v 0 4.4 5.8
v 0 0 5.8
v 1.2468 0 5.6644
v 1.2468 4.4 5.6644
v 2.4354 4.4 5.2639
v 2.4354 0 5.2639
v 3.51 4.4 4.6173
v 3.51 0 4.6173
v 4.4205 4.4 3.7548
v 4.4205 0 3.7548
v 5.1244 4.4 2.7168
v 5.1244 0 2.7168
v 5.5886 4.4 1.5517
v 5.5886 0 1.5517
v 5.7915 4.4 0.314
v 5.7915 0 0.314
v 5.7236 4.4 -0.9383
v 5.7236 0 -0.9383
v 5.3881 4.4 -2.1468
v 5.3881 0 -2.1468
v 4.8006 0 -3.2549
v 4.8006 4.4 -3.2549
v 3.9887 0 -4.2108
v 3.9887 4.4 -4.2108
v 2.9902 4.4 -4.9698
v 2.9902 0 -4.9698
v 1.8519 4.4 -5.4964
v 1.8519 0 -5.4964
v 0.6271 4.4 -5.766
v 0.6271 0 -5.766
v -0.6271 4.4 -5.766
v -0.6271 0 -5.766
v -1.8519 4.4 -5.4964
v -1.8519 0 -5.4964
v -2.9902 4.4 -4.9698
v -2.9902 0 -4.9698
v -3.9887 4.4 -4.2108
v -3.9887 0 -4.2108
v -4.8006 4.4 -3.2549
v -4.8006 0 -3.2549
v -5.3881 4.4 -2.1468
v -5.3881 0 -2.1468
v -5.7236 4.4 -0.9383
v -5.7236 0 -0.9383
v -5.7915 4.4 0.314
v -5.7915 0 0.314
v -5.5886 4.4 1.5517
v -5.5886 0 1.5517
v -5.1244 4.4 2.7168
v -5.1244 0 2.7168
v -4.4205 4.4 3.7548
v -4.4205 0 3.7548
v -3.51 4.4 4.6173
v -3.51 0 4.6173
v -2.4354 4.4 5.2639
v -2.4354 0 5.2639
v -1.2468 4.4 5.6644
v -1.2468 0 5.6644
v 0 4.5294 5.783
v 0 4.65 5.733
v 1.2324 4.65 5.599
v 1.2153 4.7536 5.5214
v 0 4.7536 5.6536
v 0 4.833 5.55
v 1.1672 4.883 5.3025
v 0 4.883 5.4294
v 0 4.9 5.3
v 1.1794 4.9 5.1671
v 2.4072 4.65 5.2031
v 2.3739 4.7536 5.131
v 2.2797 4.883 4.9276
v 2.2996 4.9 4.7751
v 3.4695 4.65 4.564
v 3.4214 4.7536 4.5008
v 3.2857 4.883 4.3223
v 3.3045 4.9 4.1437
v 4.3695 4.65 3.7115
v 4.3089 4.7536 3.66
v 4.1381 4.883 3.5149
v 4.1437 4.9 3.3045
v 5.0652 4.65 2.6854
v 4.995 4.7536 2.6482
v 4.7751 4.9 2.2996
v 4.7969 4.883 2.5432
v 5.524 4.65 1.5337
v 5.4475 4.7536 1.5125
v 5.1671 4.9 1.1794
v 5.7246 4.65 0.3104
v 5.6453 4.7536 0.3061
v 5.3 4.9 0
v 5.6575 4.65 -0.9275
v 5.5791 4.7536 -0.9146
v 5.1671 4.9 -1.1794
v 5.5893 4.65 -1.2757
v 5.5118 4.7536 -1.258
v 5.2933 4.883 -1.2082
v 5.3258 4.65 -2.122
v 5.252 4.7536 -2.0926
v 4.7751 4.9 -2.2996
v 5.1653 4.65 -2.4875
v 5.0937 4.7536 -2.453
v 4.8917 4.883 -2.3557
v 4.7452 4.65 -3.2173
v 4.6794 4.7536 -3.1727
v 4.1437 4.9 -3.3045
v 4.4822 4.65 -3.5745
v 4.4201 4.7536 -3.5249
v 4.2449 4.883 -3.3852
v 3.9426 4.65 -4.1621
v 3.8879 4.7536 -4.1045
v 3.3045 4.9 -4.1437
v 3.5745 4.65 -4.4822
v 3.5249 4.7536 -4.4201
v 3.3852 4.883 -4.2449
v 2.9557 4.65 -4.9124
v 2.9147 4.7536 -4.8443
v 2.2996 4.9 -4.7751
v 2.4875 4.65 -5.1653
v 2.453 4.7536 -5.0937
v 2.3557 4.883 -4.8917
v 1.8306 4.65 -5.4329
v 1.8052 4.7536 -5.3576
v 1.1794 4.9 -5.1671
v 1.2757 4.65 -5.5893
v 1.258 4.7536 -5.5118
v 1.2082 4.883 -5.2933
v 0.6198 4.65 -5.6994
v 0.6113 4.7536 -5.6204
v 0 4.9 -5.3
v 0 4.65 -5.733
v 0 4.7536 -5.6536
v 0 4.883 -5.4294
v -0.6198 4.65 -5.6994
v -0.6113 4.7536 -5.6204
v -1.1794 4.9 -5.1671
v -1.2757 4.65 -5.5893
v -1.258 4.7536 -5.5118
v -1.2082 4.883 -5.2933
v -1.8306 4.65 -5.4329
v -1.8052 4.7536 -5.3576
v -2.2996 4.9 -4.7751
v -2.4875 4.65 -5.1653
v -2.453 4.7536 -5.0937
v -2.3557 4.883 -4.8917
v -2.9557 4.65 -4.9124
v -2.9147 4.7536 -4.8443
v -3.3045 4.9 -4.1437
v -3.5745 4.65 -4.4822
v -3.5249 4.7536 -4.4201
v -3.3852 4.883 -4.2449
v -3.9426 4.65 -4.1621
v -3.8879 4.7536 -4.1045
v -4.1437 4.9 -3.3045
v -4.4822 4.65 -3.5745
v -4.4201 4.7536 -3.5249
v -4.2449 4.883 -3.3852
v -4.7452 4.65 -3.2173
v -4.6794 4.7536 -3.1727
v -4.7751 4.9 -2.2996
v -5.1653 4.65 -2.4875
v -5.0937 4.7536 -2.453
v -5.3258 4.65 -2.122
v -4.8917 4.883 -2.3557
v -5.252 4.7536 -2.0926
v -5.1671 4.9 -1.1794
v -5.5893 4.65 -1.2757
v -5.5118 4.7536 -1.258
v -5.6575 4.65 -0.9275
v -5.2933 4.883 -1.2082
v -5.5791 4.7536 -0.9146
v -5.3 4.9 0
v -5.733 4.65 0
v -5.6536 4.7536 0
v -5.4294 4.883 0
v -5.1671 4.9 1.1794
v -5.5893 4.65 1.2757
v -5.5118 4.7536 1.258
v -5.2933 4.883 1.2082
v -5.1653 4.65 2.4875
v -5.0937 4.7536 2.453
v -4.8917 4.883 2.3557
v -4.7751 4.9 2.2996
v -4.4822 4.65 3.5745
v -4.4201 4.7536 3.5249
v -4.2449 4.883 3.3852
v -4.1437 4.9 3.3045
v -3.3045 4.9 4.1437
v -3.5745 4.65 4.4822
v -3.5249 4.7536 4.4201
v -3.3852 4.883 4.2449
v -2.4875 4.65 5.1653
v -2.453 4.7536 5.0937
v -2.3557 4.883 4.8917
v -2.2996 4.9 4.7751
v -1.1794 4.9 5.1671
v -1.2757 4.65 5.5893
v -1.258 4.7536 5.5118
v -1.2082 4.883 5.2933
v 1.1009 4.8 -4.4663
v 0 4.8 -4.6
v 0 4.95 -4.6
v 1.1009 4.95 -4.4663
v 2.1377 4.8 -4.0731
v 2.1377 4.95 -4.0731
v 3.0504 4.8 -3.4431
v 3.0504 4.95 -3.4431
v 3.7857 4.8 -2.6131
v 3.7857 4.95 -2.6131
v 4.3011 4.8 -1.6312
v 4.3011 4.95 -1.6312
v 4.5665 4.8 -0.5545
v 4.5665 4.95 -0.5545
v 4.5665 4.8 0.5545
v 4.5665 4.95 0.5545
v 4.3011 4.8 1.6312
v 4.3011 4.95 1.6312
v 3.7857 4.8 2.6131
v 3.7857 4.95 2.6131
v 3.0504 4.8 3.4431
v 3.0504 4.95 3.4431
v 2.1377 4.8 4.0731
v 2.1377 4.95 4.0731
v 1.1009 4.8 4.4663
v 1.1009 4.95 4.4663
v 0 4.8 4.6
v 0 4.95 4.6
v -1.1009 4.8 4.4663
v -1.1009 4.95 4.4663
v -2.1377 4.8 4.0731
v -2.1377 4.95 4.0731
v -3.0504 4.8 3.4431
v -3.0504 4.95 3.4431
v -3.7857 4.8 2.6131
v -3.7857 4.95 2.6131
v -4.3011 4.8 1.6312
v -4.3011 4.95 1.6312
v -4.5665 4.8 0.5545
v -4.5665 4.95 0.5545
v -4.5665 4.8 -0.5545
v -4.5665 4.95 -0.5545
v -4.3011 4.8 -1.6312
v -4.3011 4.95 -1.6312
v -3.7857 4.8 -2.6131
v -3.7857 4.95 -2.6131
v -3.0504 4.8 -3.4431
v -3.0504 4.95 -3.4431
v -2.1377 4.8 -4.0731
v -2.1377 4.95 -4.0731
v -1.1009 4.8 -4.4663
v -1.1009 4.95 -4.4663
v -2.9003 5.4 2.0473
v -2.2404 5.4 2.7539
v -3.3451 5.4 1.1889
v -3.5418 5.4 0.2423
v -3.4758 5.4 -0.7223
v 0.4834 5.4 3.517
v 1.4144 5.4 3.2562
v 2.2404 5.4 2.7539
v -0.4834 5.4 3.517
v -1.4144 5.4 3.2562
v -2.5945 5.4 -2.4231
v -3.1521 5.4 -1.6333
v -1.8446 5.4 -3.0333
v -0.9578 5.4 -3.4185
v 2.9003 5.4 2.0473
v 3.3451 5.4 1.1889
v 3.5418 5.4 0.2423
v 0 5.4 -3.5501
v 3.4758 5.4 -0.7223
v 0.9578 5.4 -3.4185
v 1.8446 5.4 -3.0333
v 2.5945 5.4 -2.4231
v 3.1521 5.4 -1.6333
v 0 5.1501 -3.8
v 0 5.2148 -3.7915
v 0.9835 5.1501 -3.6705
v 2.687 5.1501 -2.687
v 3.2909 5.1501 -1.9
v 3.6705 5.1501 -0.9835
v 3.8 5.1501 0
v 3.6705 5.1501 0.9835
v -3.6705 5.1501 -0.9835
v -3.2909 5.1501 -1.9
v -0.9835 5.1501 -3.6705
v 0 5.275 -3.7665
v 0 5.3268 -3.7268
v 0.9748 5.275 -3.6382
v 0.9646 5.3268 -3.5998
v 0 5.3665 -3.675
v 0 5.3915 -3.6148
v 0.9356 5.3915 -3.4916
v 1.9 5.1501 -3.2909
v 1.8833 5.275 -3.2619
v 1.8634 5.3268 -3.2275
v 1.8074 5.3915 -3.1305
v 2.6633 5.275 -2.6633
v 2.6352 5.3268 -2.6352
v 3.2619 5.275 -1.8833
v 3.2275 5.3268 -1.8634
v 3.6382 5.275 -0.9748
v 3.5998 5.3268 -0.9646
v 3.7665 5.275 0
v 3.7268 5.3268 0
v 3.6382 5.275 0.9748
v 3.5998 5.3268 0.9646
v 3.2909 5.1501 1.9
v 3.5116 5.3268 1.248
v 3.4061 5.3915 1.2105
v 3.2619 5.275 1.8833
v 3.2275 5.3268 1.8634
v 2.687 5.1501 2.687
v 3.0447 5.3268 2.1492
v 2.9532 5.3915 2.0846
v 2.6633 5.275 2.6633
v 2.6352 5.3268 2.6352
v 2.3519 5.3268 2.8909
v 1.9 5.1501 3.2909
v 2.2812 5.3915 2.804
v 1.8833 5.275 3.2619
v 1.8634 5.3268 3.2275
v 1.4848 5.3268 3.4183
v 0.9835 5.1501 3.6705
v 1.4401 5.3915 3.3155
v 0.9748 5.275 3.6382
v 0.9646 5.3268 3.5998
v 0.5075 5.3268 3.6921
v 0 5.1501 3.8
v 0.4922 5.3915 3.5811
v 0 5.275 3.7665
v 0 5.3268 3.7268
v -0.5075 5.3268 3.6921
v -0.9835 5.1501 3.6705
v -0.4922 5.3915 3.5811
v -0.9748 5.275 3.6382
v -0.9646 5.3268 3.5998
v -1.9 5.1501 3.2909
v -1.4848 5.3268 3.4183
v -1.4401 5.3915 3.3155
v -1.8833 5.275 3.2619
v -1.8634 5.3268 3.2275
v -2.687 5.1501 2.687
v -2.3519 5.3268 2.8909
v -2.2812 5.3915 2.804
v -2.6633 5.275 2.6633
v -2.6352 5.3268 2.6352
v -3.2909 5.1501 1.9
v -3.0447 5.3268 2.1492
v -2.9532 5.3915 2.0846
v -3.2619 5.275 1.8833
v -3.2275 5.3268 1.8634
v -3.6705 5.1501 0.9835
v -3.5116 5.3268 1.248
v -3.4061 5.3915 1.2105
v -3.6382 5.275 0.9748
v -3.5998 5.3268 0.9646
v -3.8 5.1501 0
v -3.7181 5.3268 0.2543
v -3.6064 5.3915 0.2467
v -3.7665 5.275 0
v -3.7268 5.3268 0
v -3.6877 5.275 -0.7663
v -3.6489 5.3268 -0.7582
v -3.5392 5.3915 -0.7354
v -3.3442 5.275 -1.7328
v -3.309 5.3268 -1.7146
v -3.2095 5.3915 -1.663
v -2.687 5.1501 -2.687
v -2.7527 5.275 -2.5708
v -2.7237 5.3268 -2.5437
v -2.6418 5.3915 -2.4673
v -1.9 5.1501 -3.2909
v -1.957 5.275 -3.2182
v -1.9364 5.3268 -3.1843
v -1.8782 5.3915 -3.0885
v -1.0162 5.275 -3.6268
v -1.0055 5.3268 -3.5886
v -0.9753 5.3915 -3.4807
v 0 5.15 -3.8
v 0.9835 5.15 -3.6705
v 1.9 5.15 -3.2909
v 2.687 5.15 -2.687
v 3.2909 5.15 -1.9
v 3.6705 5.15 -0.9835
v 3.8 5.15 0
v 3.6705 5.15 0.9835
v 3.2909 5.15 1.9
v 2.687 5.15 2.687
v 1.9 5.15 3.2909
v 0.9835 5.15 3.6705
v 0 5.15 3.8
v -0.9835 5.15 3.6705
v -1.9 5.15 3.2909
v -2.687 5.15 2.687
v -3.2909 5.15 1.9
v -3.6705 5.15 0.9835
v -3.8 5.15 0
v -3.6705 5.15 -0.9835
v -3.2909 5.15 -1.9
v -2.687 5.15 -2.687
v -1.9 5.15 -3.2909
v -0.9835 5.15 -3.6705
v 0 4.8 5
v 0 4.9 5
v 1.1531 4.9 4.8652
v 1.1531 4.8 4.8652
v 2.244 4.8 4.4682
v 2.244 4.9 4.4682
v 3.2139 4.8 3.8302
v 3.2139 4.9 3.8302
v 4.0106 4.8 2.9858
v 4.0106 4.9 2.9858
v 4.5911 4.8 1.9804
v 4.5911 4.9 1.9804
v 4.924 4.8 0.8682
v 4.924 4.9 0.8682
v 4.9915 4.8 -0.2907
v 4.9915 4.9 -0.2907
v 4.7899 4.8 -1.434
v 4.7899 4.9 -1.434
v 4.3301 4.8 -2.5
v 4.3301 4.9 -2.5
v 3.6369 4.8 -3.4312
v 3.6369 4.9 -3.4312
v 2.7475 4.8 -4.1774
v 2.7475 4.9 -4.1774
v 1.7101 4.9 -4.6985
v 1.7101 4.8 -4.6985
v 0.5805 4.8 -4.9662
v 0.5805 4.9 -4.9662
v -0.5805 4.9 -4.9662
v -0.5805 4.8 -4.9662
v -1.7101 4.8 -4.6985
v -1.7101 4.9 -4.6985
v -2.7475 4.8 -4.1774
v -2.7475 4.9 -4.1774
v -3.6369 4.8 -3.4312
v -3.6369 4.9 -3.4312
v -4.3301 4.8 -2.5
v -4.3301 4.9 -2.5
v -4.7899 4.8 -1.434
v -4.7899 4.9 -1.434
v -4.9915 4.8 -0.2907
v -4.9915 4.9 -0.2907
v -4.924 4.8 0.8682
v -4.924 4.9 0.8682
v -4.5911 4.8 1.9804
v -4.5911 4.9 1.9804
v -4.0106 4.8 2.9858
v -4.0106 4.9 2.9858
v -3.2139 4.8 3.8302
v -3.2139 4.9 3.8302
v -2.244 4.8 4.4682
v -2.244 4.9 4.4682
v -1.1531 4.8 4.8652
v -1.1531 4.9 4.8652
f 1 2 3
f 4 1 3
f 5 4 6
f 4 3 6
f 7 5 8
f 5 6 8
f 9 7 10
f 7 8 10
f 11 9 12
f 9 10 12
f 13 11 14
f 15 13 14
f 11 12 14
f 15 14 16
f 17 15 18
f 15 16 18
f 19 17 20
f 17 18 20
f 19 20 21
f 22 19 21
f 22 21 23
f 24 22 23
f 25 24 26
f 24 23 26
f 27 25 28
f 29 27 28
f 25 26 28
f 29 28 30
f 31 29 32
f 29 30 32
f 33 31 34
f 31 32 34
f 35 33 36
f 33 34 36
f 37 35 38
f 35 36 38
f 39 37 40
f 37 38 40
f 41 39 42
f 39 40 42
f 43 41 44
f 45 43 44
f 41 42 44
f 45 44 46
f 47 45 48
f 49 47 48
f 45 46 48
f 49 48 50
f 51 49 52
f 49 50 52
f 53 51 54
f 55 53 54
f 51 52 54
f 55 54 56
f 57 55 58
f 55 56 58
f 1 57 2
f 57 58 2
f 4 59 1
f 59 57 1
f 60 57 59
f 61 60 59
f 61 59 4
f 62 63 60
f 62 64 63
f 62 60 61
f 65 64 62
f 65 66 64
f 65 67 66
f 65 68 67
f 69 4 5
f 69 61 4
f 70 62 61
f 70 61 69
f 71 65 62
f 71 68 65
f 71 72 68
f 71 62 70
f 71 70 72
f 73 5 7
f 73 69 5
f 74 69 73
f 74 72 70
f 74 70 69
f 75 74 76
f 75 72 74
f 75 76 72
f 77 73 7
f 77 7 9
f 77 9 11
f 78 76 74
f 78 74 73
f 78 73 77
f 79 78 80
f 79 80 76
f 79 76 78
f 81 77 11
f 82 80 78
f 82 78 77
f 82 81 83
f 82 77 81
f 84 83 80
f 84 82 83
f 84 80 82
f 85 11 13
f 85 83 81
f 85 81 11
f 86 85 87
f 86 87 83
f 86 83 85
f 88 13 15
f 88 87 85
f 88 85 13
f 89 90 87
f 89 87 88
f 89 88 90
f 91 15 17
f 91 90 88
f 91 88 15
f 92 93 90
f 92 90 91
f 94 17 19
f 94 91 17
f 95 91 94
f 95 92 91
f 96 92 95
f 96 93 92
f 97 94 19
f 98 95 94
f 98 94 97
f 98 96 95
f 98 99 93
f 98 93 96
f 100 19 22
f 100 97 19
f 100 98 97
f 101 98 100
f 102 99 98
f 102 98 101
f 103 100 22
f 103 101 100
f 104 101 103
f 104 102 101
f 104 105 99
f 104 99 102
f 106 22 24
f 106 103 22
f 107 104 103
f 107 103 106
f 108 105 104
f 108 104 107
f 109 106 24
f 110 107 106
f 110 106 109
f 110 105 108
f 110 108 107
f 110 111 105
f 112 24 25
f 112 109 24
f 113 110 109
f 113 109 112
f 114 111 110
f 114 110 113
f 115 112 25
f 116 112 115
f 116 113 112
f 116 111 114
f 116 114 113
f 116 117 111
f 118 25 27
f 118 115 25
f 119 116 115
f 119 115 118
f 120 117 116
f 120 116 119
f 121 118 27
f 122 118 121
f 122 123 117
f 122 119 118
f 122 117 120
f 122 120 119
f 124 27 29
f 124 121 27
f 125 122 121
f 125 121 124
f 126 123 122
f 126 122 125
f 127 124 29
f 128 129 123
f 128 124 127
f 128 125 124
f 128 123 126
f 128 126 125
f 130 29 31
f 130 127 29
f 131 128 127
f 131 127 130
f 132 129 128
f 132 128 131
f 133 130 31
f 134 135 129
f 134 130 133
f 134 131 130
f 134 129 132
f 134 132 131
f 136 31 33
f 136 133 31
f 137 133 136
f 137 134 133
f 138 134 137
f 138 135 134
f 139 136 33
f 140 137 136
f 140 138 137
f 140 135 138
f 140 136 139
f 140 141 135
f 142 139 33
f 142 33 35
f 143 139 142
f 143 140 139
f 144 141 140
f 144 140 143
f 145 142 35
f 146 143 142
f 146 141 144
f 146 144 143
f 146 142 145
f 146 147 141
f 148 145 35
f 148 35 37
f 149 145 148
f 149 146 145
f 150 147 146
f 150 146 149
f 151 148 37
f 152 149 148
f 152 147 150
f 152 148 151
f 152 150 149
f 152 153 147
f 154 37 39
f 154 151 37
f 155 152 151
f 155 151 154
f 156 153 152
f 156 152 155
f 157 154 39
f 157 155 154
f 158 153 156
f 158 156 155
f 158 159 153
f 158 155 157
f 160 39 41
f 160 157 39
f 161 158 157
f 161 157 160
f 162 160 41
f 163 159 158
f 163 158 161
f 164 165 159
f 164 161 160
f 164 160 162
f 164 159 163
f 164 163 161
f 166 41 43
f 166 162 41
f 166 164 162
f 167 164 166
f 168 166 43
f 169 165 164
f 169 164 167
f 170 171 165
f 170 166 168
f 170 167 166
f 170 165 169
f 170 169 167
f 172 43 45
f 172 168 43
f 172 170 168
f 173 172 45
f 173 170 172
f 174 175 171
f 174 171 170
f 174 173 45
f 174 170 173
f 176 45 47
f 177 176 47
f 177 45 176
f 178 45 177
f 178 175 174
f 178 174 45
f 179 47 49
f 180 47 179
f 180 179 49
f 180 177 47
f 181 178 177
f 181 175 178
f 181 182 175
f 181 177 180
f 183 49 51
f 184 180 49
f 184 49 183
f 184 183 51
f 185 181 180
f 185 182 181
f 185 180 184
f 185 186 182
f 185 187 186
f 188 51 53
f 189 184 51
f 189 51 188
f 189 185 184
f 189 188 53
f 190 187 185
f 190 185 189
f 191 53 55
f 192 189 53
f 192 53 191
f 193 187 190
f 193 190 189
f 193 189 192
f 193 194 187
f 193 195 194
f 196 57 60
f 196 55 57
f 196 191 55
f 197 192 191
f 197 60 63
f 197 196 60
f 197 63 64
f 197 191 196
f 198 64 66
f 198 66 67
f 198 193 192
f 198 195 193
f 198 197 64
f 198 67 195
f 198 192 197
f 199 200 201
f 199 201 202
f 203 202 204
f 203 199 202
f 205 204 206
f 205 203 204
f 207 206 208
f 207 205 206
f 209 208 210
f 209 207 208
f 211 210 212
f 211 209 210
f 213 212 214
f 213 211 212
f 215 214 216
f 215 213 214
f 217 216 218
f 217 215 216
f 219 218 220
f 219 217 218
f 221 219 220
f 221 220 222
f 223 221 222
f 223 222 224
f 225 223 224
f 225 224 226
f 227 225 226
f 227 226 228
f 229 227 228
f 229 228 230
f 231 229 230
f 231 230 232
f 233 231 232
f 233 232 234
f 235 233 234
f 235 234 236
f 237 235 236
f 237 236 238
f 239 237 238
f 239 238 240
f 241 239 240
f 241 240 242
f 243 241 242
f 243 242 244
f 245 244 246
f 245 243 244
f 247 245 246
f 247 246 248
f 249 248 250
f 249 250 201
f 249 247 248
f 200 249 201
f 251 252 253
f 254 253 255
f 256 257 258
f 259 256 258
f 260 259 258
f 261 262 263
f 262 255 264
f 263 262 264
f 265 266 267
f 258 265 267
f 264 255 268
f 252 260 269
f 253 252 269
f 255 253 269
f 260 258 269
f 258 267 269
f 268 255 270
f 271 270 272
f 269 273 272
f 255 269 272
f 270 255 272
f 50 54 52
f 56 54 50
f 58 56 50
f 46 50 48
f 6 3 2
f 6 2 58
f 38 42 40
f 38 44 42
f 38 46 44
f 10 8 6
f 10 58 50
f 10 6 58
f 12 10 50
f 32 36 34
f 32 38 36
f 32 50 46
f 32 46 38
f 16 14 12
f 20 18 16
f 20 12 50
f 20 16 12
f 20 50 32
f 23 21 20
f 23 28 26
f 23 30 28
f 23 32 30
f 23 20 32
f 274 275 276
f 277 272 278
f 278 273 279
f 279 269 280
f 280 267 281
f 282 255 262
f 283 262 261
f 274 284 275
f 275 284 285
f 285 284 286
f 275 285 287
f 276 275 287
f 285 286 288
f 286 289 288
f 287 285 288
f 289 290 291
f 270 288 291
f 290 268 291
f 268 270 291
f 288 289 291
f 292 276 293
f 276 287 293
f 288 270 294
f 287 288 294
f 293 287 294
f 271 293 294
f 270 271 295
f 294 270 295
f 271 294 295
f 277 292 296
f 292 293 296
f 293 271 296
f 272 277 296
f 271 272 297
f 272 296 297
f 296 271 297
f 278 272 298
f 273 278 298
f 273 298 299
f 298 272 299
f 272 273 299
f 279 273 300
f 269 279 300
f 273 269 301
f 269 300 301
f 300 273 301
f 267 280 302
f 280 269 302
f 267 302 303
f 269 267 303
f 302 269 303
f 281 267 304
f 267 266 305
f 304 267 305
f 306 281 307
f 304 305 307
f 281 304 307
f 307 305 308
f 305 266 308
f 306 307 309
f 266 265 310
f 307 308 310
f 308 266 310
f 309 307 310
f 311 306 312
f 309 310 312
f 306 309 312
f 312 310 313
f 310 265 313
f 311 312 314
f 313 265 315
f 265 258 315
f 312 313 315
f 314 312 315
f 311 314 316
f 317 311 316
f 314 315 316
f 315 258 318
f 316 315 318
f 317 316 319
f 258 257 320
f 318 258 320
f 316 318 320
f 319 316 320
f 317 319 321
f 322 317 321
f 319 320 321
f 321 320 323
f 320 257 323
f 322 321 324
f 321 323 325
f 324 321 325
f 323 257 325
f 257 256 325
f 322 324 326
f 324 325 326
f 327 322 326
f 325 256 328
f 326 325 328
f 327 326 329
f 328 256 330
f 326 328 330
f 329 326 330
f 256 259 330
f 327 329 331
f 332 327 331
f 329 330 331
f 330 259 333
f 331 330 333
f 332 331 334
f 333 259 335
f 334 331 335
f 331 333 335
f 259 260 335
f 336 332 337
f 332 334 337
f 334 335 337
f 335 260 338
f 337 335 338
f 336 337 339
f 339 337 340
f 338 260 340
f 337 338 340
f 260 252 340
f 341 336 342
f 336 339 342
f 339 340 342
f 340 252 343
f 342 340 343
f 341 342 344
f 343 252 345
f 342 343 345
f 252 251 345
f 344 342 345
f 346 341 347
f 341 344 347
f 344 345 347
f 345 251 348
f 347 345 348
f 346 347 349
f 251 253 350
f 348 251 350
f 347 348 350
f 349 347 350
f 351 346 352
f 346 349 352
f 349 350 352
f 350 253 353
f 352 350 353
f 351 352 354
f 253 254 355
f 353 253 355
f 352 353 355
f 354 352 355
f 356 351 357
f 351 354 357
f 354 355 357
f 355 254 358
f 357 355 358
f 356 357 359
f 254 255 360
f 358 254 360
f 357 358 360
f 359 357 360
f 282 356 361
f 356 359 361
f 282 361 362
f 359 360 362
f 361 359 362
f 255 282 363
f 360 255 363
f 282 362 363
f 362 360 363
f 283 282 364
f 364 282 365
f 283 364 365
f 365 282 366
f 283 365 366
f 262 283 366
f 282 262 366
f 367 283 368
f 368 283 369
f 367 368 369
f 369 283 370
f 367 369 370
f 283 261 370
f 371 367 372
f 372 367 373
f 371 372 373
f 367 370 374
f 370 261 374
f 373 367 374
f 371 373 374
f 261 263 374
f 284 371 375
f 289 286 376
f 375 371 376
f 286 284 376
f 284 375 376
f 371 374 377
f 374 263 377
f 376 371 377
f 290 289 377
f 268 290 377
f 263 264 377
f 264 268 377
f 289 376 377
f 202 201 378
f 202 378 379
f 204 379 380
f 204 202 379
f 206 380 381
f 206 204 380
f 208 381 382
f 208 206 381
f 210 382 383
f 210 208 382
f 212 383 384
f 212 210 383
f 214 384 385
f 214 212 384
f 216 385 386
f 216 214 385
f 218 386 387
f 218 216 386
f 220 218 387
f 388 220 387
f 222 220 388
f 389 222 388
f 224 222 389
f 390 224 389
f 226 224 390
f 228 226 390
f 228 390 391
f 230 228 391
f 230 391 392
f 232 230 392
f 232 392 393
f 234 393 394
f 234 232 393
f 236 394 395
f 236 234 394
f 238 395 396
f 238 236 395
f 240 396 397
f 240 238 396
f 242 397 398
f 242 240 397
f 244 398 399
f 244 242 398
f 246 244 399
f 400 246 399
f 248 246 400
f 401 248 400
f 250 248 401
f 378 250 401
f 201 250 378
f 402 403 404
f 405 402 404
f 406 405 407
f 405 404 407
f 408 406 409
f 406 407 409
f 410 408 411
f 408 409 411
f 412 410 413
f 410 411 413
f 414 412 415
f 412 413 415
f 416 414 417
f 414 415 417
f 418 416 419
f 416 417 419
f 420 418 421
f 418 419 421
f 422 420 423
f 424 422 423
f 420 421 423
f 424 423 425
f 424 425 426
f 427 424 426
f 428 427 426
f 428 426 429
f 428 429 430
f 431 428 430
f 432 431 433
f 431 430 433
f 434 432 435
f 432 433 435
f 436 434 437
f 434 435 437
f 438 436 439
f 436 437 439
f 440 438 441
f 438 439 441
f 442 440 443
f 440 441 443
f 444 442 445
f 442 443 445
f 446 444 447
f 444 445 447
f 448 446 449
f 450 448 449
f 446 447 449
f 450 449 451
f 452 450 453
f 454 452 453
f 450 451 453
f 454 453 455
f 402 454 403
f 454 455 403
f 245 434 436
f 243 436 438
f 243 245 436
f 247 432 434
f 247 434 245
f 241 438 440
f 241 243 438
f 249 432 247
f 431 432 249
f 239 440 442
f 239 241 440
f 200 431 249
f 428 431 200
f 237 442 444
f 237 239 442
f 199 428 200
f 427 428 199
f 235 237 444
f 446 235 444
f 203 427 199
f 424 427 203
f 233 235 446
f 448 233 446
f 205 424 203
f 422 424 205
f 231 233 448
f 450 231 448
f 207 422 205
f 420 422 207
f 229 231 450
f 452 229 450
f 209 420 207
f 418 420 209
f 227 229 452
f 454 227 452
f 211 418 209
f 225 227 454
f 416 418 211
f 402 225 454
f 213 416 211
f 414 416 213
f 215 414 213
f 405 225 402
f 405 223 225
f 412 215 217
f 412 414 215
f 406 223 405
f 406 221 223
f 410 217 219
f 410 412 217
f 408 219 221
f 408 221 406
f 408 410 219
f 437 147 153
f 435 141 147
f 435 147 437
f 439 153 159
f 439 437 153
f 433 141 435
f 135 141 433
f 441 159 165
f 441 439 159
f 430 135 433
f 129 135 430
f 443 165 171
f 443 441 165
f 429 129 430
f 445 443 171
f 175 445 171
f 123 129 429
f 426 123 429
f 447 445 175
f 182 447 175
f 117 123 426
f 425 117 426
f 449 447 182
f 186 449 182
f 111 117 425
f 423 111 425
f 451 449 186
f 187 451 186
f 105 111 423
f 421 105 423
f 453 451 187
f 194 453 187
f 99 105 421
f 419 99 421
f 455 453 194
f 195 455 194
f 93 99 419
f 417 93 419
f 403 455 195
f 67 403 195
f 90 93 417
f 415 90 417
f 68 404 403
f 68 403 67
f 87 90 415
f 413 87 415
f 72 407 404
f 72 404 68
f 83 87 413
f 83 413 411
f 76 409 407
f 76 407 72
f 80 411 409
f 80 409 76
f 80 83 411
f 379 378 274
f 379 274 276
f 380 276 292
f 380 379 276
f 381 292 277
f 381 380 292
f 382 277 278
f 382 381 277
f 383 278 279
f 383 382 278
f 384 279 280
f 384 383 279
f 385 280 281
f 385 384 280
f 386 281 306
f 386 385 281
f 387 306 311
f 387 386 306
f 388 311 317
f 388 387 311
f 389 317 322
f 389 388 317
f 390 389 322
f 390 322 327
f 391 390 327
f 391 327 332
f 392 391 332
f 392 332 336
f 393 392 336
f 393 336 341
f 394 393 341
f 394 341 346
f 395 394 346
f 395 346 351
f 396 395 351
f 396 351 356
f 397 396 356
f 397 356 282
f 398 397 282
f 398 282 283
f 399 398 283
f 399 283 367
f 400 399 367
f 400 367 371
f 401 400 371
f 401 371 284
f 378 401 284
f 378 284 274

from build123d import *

# Parameters (mm, degrees)
CROQUIS1_R              = 5.8
SALIENTE_EXTRUIR1_DEPTH = 4.9
REDONDEO1_R             = 0.5
CROQUIS2_R              = 5
CORTAR_EXTRUIR1_DEPTH   = 0.1
CROQUIS3_R              = 4.6
SALIENTE_EXTRUIR2_DEPTH = 5.15
CROQUIS4_R              = 3.8
SALIENTE_EXTRUIR3_DEPTH = 5.4
REDONDEO7_R             = 0.25
CHAFL_N1_SIZE           = 0.8
CHAFL_N1_SIZE_2         = 0.2


# Some blends are built 0.0001 mm under size
with BuildPart() as part:
    # Croquis1 → Saliente-Extruir1 (new body)
    with BuildSketch(Plane(origin=(0, 0, 0), x_dir=(1, 0, 0), z_dir=(0, 1, 0))):
        with Locations(Location((0, 0, 0), (0, 0, 270))):
            Circle(CROQUIS1_R)
    extrude(amount=SALIENTE_EXTRUIR1_DEPTH)

    # Redondeo1
    redondeo1_edges = [part.edges().sort_by_distance(p)[0] for p in [
        (0, 4.9, -5.8),
    ]]
    fillet(redondeo1_edges, radius=REDONDEO1_R)

    # Croquis2 → Cortar-Extruir1 (cut)
    with BuildSketch(Plane(origin=(0, 4.9, 0), x_dir=(1, 0, 0), z_dir=(0, 1, 0))):
        with Locations(Location((0, 0, 0), (0, 0, 270))):
            Circle(CROQUIS2_R)
    extrude(amount=-CORTAR_EXTRUIR1_DEPTH, mode=Mode.SUBTRACT)

    # Croquis3 → Saliente-Extruir2 (add)
    with BuildSketch(Plane.XZ):
        with Locations(Location((0, 0, 0), (0, 0, 270))):
            Circle(CROQUIS3_R)
    extrude(amount=-SALIENTE_EXTRUIR2_DEPTH)

    # Croquis4 → Saliente-Extruir3 (add)
    with BuildSketch(Plane.XZ):
        with Locations(Location((0, 0, 0), (0, 0, 270))):
            Circle(CROQUIS4_R)
    extrude(amount=-SALIENTE_EXTRUIR3_DEPTH)

    # Redondeo7
    redondeo7_edges = [part.edges().sort_by_distance(p)[0] for p in [
        (0, 5.4, 3.8),
    ]]
    fillet(redondeo7_edges, radius=REDONDEO7_R - 0.0001)  # a hair under: the kernel refuses the full size

    # Chaflán1
    # the kernel refuses this chamfer: 0.8, 0.2 mm, written as the material it takes off along each edge
    with BuildSketch(Plane(origin=(0, 5.15, 0), x_dir=(0, 0, -1), z_dir=(-1, 0, 0))) as chafl_n1_piece_1_section:
        Polygon((4.6 - CHAFL_N1_SIZE, 0), (4.6, CHAFL_N1_SIZE_2), (4.6, 0), align=None)
    chafl_n1_piece_1 = revolve(axis=Axis((0, 5.15, 0), (0, -1, 0)), mode=Mode.PRIVATE)
    chafl_n1_piece_1 = chafl_n1_piece_1 - Plane(origin=(0, 5.059567154, 0), x_dir=(0, 0, -1), z_dir=(0, -1, 0)) * Cylinder(3.8, 19, mode=Mode.PRIVATE)
    add(chafl_n1_piece_1, mode=Mode.SUBTRACT)


solid = part.part
